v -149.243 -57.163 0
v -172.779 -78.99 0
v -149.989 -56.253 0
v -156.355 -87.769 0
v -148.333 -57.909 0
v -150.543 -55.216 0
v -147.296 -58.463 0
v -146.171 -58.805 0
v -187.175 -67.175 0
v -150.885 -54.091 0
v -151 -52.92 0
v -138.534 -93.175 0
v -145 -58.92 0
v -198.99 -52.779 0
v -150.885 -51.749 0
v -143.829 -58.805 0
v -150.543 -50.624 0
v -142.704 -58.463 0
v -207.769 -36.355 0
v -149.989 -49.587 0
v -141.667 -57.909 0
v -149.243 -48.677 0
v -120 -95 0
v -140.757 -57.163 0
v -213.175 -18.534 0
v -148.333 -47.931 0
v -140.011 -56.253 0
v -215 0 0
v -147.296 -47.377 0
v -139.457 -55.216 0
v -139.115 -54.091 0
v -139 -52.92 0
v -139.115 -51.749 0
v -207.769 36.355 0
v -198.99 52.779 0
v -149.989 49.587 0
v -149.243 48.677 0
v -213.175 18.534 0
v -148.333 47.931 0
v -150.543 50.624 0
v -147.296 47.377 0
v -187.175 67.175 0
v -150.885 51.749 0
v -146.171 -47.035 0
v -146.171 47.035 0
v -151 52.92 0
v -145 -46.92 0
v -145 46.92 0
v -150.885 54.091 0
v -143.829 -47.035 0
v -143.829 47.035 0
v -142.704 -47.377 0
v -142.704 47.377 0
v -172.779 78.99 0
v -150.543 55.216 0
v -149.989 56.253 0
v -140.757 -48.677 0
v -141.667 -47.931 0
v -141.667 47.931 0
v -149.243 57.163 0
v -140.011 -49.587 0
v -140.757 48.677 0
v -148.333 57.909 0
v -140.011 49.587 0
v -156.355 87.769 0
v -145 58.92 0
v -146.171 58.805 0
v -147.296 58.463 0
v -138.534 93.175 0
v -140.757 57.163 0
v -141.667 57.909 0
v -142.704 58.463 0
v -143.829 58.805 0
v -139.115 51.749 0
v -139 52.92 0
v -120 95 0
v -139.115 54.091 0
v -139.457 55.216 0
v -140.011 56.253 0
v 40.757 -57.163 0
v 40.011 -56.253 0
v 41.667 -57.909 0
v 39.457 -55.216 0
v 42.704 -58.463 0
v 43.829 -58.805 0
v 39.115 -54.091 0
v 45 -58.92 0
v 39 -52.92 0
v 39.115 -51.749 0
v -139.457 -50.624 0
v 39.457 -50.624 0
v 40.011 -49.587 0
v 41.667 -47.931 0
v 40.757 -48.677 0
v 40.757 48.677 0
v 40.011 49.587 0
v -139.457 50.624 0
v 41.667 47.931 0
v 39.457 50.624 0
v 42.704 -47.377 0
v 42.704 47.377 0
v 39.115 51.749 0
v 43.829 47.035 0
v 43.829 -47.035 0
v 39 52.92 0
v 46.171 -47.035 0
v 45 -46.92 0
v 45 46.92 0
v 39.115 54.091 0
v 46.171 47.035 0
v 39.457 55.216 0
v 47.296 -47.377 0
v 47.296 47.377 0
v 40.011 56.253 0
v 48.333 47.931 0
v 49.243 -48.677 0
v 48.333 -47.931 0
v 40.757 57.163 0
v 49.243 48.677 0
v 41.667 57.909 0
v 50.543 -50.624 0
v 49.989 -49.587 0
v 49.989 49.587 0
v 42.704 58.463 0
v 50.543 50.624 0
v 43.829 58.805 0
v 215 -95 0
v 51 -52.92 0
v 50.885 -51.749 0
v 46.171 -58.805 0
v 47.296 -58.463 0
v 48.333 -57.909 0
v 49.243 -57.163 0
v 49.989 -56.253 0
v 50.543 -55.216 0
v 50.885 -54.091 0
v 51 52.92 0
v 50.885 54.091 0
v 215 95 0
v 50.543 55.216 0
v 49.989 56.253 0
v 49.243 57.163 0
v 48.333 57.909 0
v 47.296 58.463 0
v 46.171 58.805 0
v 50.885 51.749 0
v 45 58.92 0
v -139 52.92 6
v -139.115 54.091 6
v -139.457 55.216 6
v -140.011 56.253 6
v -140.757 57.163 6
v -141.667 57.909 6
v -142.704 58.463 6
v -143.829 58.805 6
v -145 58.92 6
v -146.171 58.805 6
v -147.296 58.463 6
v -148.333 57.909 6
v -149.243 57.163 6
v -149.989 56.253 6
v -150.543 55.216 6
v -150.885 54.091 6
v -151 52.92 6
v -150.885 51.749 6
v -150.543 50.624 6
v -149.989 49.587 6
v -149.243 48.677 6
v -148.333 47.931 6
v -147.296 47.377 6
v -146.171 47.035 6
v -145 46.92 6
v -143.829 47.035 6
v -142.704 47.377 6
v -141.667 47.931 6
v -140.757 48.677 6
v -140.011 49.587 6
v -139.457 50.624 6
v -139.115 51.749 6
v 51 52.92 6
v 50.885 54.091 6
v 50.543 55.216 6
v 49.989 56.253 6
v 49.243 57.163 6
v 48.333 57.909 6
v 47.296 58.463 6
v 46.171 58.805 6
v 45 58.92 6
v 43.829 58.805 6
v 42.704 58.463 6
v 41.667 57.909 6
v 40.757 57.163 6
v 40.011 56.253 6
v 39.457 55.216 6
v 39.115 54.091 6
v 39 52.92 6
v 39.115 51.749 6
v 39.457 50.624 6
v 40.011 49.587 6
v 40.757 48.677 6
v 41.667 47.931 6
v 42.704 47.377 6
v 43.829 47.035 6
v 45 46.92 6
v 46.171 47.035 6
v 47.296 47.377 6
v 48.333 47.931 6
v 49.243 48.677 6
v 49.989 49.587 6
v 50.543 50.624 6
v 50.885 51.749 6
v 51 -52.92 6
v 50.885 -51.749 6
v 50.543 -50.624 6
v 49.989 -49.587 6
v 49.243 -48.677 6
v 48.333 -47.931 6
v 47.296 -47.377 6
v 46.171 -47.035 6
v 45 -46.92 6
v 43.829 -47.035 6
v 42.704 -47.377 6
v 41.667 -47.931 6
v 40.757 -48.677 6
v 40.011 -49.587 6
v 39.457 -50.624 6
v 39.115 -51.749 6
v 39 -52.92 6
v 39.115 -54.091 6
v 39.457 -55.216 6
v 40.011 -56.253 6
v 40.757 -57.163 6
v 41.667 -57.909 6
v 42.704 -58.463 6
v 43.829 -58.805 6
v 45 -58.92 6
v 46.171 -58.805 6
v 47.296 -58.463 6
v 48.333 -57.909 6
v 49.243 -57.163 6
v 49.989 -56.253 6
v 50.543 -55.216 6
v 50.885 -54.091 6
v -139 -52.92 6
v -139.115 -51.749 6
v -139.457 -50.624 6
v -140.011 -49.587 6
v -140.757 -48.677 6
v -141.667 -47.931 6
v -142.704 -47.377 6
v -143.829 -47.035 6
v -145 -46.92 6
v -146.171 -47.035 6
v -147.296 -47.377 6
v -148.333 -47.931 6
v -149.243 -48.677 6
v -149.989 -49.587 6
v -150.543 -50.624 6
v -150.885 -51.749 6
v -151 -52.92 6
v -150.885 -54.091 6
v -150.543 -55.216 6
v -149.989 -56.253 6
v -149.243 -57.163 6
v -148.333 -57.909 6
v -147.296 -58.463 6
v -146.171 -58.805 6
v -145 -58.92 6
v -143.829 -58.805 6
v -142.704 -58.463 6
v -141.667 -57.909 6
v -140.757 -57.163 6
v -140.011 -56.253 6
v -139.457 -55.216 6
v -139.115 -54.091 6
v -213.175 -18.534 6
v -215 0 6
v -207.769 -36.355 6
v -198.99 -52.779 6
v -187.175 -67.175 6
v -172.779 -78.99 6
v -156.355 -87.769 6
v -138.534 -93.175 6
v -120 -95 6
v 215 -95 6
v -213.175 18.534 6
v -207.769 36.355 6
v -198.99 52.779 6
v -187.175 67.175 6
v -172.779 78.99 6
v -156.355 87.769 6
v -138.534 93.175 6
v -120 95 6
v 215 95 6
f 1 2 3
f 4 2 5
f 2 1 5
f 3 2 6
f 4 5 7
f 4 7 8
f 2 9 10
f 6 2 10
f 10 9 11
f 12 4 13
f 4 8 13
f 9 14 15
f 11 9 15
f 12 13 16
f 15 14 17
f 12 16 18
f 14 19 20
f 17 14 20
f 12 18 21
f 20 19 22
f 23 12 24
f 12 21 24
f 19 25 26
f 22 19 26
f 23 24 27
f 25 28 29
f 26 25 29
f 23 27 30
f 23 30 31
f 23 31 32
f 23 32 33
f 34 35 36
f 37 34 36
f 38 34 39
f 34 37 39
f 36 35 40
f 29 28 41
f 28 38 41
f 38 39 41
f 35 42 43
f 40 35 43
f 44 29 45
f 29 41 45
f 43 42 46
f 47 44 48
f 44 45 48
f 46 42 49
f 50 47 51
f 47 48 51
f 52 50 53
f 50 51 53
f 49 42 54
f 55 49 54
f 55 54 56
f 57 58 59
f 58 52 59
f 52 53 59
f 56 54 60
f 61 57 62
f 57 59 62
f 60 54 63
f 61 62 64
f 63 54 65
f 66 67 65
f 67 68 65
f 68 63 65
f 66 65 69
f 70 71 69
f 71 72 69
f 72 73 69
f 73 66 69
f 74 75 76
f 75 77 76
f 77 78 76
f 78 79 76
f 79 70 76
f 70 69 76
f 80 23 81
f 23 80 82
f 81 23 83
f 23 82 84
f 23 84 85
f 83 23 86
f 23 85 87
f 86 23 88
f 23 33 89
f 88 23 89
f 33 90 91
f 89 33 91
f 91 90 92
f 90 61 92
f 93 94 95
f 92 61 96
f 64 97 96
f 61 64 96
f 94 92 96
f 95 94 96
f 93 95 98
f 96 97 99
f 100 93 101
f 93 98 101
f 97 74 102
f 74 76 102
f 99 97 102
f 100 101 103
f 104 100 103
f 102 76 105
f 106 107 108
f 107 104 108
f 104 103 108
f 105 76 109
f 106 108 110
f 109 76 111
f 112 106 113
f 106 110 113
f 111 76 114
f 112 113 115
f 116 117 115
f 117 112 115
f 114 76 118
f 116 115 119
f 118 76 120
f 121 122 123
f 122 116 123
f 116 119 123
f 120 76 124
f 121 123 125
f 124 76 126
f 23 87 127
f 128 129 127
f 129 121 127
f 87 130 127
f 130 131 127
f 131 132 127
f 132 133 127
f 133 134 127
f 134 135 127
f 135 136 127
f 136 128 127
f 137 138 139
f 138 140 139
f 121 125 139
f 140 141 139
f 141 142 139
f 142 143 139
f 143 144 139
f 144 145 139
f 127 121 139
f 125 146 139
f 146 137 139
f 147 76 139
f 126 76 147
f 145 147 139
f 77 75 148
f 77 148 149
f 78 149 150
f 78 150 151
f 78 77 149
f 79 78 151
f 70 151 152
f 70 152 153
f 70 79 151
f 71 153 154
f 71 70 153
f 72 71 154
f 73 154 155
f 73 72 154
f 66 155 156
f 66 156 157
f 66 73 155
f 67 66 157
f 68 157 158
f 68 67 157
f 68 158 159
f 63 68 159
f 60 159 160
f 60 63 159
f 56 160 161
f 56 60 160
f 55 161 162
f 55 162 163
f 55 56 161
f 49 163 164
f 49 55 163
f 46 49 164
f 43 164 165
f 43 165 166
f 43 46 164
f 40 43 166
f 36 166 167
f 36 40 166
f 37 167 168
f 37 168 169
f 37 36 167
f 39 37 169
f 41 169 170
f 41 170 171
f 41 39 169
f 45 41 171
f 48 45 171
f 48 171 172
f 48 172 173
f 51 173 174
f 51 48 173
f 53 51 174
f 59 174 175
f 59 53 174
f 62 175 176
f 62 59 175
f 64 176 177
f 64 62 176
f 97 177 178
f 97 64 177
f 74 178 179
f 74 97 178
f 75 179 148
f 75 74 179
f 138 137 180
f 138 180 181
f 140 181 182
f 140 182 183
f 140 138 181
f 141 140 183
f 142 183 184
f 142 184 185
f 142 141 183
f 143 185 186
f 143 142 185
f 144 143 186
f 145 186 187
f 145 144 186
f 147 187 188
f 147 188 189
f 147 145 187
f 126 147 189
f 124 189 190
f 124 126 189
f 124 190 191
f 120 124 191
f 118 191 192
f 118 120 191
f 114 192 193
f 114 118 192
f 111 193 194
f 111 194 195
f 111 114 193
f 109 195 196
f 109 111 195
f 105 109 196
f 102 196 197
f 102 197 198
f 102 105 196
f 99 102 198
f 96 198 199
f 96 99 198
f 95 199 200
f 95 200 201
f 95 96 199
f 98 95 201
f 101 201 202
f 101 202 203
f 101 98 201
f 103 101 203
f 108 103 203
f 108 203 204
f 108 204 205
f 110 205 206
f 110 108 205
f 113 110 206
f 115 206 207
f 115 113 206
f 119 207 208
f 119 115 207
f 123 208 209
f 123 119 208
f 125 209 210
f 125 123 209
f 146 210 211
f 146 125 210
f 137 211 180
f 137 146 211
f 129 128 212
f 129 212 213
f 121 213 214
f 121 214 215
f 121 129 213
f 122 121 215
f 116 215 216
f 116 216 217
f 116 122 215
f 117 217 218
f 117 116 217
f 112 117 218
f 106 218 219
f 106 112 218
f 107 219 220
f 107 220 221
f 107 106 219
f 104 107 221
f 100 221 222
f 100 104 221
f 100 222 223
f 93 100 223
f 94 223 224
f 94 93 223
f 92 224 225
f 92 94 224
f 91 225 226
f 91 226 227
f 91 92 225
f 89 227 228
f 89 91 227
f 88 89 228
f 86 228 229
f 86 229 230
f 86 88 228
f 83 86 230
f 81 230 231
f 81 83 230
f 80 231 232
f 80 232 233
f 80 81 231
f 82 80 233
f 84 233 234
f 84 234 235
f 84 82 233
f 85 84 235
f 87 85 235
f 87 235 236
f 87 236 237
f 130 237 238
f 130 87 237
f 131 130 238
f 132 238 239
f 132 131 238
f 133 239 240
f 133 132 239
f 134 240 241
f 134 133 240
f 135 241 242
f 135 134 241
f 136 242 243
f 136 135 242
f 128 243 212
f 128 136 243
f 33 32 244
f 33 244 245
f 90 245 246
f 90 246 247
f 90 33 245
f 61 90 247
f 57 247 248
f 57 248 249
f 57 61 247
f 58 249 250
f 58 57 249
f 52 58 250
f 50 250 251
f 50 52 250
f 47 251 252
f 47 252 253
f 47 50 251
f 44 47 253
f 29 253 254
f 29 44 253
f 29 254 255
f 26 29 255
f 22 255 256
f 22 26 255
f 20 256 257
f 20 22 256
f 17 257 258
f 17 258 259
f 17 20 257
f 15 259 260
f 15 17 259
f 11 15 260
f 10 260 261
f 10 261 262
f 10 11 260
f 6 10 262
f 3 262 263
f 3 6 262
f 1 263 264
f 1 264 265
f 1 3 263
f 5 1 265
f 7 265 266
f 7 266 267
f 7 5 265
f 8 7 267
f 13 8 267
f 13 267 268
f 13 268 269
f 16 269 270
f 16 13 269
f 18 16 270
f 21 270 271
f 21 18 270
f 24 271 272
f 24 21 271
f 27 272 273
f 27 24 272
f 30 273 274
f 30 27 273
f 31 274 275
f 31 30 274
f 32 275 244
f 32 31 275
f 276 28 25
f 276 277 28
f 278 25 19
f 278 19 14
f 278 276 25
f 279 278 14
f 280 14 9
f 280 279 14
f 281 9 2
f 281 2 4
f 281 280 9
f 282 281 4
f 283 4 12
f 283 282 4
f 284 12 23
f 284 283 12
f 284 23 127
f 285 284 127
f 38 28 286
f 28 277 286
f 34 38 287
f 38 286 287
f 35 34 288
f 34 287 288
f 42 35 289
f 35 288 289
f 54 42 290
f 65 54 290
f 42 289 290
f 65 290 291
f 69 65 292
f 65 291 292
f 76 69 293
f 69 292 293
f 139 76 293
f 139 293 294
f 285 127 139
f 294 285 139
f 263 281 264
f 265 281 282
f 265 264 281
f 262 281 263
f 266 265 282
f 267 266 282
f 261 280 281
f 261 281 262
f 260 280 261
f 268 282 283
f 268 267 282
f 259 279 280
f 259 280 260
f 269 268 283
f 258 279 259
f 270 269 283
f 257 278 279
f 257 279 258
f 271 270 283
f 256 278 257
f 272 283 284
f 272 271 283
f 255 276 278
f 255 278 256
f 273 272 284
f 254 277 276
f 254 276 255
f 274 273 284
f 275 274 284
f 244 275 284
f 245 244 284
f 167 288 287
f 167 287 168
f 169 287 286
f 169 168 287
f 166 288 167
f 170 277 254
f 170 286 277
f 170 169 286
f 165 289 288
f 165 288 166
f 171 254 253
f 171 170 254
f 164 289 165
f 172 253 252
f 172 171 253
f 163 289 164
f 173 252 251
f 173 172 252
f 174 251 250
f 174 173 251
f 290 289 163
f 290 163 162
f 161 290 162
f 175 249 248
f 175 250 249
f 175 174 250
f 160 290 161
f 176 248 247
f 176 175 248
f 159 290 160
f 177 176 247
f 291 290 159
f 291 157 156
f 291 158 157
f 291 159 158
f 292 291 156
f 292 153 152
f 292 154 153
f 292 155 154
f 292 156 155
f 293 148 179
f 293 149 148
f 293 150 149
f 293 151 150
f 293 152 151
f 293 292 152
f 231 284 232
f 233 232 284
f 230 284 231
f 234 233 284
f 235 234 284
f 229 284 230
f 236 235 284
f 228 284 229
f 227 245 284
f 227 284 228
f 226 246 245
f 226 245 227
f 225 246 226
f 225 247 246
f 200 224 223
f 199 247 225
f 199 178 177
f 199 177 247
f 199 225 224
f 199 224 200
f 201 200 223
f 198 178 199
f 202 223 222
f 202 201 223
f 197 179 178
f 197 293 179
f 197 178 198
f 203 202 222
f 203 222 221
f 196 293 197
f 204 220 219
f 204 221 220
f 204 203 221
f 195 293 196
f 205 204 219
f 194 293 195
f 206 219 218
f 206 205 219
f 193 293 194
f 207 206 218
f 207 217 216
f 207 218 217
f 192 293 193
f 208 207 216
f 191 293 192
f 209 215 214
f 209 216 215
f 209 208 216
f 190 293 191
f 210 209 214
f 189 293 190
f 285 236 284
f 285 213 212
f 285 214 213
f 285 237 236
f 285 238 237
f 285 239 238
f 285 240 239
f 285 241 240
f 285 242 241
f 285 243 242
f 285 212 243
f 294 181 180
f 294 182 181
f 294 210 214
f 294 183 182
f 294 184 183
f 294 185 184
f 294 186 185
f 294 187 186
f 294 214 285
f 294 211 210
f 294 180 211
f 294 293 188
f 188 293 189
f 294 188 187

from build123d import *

# Parameters (mm, degrees)
SKETCH1_W           = 430
SKETCH1_H           = 190
SKETCH1_R           = 6
BOSS_EXTRUDE1_DEPTH = 6
FILLET1_R           = 95


with BuildPart() as part:
    # Sketch1 → Boss-Extrude1 (new body)
    with BuildSketch(Plane.XY):
        Rectangle(SKETCH1_W, SKETCH1_H)
        with Locations((-145, 52.92)):
            Circle(SKETCH1_R, mode=Mode.SUBTRACT)
        with Locations((45, 52.92)):
            Circle(SKETCH1_R, mode=Mode.SUBTRACT)
        with Locations((45, -52.92)):
            Circle(SKETCH1_R, mode=Mode.SUBTRACT)
        with Locations((-145, -52.92)):
            Circle(SKETCH1_R, mode=Mode.SUBTRACT)
    extrude(amount=BOSS_EXTRUDE1_DEPTH)

    # Fillet1
    fillet1_edges = [part.edges().sort_by_distance(p)[0] for p in [
        (-215, -95, 3),
        (-215, 95, 3),
    ]]
    fillet(fillet1_edges, radius=FILLET1_R - 0.0001)  # a hair under: the kernel refuses the full size


solid = part.part
